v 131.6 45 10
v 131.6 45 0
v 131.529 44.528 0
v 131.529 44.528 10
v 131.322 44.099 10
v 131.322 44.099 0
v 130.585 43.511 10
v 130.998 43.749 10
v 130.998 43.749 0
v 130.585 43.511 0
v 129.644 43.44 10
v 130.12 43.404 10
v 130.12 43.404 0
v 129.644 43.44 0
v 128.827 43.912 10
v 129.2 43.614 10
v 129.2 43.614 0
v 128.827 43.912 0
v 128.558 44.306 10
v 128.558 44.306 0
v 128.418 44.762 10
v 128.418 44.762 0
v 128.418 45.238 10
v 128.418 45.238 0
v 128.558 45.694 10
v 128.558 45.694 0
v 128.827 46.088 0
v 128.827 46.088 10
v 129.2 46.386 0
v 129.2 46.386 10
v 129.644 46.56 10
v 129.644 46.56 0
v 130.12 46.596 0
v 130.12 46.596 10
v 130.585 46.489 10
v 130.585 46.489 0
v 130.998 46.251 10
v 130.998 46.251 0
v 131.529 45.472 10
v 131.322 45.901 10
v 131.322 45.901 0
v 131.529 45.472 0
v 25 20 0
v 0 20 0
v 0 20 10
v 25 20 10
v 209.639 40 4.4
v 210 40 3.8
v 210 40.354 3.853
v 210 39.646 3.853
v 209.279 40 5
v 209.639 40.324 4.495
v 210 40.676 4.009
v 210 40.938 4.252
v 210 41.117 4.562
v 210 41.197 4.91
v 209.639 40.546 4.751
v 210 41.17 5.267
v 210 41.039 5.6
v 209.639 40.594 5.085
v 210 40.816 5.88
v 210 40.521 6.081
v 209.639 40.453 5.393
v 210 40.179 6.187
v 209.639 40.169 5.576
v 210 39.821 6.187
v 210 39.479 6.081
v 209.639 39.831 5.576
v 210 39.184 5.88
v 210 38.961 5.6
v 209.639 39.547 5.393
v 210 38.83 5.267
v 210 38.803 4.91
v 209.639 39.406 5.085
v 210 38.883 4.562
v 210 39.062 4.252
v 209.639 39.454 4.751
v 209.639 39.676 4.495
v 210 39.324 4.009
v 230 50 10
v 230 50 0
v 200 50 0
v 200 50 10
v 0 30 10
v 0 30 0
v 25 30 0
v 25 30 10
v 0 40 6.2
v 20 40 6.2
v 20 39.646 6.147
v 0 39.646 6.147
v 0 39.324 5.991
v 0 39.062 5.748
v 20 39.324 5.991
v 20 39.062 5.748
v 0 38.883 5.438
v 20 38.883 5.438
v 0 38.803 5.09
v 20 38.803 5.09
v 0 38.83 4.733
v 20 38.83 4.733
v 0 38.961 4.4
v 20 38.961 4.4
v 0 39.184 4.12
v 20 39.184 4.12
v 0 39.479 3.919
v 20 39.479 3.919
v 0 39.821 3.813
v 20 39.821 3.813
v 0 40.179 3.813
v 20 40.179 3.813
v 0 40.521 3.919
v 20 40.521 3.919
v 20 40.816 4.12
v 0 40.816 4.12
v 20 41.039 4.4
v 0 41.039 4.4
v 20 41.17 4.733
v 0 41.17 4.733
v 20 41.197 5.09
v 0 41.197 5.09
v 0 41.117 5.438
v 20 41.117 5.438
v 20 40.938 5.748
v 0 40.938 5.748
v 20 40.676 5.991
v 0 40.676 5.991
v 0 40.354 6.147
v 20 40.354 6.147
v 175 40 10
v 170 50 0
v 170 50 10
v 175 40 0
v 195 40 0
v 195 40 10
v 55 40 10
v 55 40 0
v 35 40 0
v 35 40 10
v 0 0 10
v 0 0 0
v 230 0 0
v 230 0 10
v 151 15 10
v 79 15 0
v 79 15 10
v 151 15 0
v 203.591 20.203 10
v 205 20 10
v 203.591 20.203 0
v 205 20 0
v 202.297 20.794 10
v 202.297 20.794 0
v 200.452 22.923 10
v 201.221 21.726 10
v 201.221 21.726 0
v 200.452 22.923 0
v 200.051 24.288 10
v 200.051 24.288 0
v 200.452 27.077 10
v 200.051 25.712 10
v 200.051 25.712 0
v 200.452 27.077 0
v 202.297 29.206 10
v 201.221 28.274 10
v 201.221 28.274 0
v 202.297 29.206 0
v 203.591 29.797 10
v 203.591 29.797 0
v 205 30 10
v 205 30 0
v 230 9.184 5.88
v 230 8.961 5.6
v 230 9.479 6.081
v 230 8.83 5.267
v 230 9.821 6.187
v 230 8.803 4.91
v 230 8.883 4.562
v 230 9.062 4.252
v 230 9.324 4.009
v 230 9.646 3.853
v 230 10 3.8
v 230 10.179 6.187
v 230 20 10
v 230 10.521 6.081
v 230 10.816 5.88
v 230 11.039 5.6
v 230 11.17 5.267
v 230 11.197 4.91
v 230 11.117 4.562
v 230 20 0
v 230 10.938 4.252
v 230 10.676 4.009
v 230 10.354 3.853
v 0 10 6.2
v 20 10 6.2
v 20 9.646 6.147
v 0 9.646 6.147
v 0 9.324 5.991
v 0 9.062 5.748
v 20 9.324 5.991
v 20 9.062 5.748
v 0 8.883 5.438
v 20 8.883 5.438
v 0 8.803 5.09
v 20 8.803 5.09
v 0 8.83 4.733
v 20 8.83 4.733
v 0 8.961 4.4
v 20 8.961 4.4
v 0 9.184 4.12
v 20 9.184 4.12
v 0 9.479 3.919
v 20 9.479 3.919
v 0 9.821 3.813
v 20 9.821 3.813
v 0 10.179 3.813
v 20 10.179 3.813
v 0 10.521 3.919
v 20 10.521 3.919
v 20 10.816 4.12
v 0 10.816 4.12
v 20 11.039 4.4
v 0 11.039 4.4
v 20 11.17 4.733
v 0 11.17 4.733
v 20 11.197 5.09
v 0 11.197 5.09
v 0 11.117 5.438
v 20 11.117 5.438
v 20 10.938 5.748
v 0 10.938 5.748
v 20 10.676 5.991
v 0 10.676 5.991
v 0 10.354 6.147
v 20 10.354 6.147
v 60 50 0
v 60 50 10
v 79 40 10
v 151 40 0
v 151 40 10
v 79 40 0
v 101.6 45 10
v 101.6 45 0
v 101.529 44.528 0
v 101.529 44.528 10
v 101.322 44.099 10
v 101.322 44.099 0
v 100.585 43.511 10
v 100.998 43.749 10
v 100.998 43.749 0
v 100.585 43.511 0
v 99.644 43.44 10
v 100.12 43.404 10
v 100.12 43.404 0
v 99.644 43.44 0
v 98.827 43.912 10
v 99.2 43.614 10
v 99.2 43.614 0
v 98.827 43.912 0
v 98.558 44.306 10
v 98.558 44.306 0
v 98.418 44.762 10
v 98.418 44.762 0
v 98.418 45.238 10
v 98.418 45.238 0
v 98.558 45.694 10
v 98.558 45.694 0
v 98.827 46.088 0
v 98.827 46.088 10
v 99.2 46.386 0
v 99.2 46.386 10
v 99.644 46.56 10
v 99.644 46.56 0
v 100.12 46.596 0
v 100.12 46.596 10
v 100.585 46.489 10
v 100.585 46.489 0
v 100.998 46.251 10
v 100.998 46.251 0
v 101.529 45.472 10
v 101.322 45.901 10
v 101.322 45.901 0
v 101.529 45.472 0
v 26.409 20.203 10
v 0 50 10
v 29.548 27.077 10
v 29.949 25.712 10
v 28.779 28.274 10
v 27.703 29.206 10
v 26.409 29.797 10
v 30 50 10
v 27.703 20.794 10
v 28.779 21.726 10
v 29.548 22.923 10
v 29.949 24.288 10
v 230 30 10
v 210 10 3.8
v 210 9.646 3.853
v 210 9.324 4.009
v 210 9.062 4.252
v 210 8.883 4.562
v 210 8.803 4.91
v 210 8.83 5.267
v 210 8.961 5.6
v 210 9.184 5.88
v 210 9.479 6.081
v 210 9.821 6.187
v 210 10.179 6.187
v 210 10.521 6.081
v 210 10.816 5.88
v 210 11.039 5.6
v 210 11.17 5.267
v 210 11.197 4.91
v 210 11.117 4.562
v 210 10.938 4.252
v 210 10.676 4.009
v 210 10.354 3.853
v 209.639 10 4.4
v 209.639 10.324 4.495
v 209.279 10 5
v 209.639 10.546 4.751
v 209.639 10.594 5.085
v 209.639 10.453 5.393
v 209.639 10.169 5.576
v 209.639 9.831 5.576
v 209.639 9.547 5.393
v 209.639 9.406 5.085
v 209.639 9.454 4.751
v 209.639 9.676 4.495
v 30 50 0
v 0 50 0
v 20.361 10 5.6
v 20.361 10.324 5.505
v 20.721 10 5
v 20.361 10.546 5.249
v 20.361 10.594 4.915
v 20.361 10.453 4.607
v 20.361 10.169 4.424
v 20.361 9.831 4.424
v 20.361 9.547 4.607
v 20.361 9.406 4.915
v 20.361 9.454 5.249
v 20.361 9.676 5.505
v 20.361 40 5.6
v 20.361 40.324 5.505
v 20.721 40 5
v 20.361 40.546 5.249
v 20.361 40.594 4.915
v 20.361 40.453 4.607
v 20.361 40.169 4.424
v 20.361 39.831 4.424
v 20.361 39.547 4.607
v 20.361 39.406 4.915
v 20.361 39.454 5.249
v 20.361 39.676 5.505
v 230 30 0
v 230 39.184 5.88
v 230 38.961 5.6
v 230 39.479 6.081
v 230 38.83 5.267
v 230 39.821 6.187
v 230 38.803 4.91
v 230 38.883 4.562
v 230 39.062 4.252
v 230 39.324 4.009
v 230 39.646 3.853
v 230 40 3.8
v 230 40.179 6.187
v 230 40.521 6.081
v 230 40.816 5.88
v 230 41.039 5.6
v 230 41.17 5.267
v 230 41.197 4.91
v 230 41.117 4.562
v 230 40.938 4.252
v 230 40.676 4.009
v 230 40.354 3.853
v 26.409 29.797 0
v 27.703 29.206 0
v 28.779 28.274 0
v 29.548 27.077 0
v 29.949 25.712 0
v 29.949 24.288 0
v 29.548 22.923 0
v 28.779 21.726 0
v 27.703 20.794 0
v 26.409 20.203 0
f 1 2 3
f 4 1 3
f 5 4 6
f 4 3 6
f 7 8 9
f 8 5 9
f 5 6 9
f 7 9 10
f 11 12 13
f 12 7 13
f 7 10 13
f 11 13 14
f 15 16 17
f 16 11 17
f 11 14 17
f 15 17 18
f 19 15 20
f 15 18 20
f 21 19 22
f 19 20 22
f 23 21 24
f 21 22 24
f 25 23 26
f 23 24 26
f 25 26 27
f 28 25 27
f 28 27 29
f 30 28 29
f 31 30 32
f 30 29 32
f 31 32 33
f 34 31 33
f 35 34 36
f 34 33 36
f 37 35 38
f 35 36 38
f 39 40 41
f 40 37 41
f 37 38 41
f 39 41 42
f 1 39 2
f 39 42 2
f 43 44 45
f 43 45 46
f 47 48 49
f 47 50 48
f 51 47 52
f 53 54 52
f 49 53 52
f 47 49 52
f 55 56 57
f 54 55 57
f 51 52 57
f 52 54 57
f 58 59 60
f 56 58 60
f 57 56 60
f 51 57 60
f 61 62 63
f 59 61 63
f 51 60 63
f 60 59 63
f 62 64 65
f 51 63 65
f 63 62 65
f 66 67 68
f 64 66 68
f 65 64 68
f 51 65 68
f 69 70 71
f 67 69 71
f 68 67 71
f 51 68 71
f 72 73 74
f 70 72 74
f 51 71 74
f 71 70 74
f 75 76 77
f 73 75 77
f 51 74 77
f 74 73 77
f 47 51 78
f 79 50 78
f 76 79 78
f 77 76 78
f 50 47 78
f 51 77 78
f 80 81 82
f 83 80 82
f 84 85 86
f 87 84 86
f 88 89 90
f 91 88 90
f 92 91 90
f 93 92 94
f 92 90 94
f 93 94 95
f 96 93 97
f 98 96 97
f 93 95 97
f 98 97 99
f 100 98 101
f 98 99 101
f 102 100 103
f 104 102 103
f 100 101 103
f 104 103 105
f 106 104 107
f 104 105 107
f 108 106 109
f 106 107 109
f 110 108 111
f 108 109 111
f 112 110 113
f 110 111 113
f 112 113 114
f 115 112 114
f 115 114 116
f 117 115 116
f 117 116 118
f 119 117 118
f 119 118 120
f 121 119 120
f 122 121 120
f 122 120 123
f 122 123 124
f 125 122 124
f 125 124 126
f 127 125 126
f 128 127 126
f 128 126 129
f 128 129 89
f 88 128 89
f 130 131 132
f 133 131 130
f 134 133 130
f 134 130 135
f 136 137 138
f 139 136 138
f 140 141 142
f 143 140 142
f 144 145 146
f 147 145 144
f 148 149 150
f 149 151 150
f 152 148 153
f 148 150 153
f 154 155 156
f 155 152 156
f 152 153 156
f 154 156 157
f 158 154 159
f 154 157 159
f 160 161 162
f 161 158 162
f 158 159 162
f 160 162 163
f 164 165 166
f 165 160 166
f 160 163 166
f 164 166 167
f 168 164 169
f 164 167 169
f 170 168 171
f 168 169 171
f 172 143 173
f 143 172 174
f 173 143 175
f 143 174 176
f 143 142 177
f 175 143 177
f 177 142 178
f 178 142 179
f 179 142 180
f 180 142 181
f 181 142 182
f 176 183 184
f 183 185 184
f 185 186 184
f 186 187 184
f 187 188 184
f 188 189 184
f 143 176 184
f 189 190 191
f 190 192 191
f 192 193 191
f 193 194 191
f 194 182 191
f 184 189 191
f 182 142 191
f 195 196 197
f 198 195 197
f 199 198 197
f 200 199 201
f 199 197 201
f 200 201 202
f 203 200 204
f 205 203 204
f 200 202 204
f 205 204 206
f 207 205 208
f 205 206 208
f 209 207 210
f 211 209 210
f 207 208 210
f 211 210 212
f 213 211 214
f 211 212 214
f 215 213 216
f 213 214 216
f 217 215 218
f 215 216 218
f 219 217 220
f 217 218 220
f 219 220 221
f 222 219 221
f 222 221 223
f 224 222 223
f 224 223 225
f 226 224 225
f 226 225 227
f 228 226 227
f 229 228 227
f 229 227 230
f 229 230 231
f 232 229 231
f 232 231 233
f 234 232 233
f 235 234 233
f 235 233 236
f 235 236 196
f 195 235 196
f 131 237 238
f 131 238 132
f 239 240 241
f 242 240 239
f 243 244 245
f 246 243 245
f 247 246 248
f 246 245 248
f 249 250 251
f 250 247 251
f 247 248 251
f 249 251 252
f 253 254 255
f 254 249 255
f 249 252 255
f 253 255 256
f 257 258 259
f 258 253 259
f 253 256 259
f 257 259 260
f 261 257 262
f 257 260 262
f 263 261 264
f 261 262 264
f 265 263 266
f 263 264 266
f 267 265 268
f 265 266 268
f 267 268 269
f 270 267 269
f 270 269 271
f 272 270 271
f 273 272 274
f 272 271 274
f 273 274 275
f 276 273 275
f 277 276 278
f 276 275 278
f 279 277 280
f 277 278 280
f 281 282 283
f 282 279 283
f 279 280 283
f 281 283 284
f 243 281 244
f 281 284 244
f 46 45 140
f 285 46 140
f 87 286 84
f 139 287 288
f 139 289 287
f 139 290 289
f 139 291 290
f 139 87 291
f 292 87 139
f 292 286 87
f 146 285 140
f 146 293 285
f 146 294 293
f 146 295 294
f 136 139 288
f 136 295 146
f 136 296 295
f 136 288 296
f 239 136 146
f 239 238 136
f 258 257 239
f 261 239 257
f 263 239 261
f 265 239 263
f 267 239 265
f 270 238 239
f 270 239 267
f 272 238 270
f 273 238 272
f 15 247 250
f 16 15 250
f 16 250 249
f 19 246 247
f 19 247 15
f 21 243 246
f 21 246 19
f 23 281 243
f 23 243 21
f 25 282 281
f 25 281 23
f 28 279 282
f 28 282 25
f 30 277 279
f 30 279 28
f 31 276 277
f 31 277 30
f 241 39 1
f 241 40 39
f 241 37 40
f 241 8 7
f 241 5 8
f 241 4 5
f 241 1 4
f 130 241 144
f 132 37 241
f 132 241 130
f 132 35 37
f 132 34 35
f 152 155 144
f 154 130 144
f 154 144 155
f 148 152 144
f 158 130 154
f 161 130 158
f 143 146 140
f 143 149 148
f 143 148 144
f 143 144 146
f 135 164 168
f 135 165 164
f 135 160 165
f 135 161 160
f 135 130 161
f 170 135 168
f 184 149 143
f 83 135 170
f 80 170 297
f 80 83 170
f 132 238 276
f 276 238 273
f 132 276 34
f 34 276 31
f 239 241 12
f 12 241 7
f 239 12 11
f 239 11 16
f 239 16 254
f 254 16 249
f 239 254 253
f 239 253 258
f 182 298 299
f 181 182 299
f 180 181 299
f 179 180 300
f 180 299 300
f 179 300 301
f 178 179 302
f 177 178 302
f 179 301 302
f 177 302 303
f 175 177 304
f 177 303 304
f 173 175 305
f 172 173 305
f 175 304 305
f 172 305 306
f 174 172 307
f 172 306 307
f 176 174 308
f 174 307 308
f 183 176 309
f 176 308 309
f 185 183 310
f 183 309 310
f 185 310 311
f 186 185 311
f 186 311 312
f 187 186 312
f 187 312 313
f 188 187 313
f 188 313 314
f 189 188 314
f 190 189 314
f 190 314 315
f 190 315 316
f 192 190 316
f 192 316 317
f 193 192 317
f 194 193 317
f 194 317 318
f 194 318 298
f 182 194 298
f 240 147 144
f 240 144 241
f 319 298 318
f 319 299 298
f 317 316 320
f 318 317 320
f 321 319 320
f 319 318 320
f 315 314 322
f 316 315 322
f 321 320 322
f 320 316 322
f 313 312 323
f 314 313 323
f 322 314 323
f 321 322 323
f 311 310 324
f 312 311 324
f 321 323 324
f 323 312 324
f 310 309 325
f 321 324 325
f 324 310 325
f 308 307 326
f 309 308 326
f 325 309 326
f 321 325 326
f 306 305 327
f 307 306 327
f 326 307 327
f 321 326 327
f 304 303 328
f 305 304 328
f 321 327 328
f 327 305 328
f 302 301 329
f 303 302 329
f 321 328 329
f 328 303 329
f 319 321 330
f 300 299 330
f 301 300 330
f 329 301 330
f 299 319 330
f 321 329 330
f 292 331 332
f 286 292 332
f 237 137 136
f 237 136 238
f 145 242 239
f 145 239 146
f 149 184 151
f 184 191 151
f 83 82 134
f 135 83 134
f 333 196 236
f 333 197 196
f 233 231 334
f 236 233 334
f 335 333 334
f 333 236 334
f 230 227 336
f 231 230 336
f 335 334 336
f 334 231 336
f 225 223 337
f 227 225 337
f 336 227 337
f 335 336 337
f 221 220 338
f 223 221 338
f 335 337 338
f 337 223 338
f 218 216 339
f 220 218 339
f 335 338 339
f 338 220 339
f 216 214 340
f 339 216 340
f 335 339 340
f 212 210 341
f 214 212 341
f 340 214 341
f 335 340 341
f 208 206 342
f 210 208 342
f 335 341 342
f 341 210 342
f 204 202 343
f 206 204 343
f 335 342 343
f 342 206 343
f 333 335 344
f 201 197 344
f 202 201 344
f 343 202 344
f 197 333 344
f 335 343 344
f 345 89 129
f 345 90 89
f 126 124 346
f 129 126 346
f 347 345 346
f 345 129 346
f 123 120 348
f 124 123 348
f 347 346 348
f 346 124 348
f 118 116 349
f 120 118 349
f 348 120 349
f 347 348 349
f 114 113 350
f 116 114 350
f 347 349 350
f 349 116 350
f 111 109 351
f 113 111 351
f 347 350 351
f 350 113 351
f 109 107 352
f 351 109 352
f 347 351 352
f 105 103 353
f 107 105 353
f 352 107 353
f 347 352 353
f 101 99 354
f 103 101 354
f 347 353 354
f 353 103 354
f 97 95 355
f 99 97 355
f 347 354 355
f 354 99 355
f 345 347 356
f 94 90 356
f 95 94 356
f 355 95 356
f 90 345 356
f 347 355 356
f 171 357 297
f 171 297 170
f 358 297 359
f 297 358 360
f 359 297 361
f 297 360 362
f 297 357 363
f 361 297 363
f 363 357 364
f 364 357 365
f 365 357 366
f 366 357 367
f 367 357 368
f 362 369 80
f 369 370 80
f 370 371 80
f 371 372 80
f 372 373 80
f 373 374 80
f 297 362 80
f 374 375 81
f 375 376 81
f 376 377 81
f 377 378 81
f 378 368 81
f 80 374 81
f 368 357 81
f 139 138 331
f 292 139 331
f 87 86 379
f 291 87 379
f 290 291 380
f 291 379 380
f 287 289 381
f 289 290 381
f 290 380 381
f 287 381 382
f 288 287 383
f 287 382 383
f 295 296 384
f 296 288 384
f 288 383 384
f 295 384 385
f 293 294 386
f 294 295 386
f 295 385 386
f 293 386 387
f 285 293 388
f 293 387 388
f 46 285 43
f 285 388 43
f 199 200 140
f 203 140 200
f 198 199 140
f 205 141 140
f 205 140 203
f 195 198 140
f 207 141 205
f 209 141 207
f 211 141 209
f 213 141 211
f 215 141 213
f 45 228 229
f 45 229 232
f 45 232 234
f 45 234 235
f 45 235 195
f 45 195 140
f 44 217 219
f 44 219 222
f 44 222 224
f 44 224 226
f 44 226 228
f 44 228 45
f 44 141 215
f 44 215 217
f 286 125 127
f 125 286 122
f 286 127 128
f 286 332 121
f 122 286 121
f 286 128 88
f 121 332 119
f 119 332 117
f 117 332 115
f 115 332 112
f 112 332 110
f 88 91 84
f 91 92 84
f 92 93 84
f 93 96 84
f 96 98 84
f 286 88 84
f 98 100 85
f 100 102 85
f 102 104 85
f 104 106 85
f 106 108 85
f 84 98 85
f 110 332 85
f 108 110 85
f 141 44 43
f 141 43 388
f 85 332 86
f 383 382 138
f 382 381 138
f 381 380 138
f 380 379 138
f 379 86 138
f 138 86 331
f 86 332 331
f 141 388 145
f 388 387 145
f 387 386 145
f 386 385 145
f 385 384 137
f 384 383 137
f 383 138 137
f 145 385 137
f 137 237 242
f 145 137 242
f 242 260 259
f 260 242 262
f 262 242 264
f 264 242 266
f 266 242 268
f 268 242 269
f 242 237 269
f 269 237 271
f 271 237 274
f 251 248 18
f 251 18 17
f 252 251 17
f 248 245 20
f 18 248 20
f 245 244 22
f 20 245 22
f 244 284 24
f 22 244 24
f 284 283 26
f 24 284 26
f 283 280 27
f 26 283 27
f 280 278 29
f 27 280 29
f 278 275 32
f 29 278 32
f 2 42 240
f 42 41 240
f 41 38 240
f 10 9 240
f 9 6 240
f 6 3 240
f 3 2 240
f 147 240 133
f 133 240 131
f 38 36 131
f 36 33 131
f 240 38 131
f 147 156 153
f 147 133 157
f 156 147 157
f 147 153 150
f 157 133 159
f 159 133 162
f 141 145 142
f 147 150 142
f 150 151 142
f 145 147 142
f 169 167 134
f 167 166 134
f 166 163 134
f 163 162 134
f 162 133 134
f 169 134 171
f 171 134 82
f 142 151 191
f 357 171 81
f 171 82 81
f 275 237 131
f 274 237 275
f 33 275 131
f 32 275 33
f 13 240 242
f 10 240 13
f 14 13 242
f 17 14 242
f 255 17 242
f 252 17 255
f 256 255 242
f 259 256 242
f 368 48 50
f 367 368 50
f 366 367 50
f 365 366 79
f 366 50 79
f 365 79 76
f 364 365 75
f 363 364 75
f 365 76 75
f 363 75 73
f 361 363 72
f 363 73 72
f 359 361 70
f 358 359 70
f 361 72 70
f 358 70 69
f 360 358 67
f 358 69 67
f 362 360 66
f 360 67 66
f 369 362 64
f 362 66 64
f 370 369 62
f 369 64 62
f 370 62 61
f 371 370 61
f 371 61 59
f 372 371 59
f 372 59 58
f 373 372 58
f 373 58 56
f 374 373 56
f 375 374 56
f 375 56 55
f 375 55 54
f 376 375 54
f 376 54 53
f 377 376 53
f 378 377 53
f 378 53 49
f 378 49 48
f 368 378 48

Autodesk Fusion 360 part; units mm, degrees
sketch "Skizze1" plane through (0, 0, 0) normal (0, 0, 1) x (1, 0, 0)
  line L0 (0, 0) -> (230, 0)
  line L1 (230, 0) -> (230, 20)
  line L2 (230, 20) -> (205, 20)
  line L3 (230, 30) -> (205, 30)
  line L4 (230, 30) -> (230, 50)
  line L5 (230, 50) -> (200, 50)
  line L6 (170, 50) -> (175, 40)
  line L7 (175, 40) -> (195, 40)
  line L8 (200, 50) -> (195, 40)
  line L9 (55, 40) -> (35, 40)
  line L10 (55, 40) -> (60, 50)
  line L11 (35, 40) -> (30, 50)
  line L12 (30, 50) -> (0, 50)
  line L13 (0, 50) -> (0, 30)
  line L14 (0, 30) -> (25, 30)
  line L15 (0, 0) -> (0, 20)
  line L16 (0, 20) -> (25, 20)
  arc A0 (25, 20) -> (25, 30) centre (25, 25) ccw
  arc A1 (205, 30) -> (205, 20) centre (205, 25) ccw
  line L17 (115, 40) -> (79, 40)
  line L18 (115, 40) -> (151, 40)
  line L19 (79, 40) -> (79, 15)
  line L20 (79, 15) -> (151, 15)
  line L21 (151, 15) -> (151, 40)
  circle A2 centre (100, 45) radius 1.6
  circle A3 centre (130, 45) radius 1.6
  line L22 (60, 50) -> (170, 50)
  dimension "d1" = 230
  dimension "d2" = 20
  dimension "d3" = 25
  dimension "d6" = 10
  dimension "d7" = 25
  dimension "d8" = 20
  dimension "d9" = 30
  dimension "d11" = 30
  dimension "d14" = 20
  dimension "d15" = 110
  dimension "d18" = 20
  dimension "d20" = 30
  dimension "d21" = 20
  dimension "d22" = 25
  dimension "d23" = 20
  dimension "d24" = 25
  dimension "d27" = 36
  dimension "d28" = 36
  dimension "d29" = 25
  dimension "d30" = 72
  dimension "d33" = 3.2
extrude "Extrusion1" add sketch "Skizze1" along normal blind 10
sketch "Skizze2" plane through (230, 0, 0) normal (1, 0, 0) x (0, 1, 0)
  line L0 (0, 0) -> (20, 0)
  line L1 (20, 0) -> (20, 10)
  line L2 (20, 10) -> (0, 10)
  line L3 (0, 10) -> (0, 0)
  line L4 (0, 10) -> (20, 0)
  line L5 (20, 10) -> (0, 0)
  line L6 (49.9281, 0) -> (49.9281, 10)
  circle A0 centre (10, 5) radius 1.2
  dimension "d36" = 2.4
sketch "Skizze3" plane through (230, 0, 0) normal (1, 0, 0) x (0, 1, 0)
  line L0 (30, 0) -> (50, 0)
  line L1 (50, 0) -> (50, 10)
  line L2 (50, 10) -> (30, 10)
  line L3 (30, 10) -> (30, 0)
  line L4 (30, 10) -> (50, 0)
  line L5 (50, 10) -> (30, 0)
  circle A0 centre (40, 5) radius 1.2
  dimension "d37" = 2.4
sketch "Skizze4" plane through (0, 0, 0) normal (-1, 0, 0) x (0, -1, 0)
  line L0 (-50, 0) -> (-30, 0)
  line L1 (-30, 0) -> (-30, 10)
  line L2 (-30, 10) -> (-50, 10)
  line L3 (-50, 10) -> (-50, 0)
  line L4 (-50, 10) -> (-30, 0)
  line L5 (-30, 10) -> (-50, 0)
  line L6 (0, 0) -> (0, 10)
  circle A0 centre (-40, 5) radius 1
  dimension "d38" = 2
sketch "Skizze5" plane through (0, 0, 0) normal (-1, 0, 0) x (0, -1, 0)
  line L0 (-20, 0) -> (0, 0)
  line L1 (0, 0) -> (0, 10)
  line L2 (0, 10) -> (-20, 10)
  line L3 (-20, 10) -> (-20, 0)
  line L4 (-20, 10) -> (0, 0)
  line L5 (0, 10) -> (-20, 0)
  circle A0 centre (-10, 5) radius 1
  dimension "d39" = 2
hole "Bohrung1" at (230, 10, 5) direction (-1, 0, 0) diameter 2.4 depth 20 tip angle 118
hole "Bohrung2" at (230, 40, 5) direction (-1, 0, 0) diameter 2.4 depth 20 tip angle 118
hole "Bohrung3" at (0, 10, 5) direction (1, 0, 0) diameter 2.4 depth 20 tip angle 118
hole "Bohrung4" at (0, 40, 5) direction (1, 0, 0) diameter 2.4 depth 20 tip angle 118
equation "d36 = Montagelochdurchmesser"
equation "d37 = Montagelochdurchmesser"
equation "d41 = Montagelochdurchmesser"
equation "d44 = Montagelochdurchmesser"
equation "d47 = Montagelochdurchmesser"
equation "d50 = Montagelochdurchmesser"
equation "Montagelochdurchmesser = 2.4 mm"
